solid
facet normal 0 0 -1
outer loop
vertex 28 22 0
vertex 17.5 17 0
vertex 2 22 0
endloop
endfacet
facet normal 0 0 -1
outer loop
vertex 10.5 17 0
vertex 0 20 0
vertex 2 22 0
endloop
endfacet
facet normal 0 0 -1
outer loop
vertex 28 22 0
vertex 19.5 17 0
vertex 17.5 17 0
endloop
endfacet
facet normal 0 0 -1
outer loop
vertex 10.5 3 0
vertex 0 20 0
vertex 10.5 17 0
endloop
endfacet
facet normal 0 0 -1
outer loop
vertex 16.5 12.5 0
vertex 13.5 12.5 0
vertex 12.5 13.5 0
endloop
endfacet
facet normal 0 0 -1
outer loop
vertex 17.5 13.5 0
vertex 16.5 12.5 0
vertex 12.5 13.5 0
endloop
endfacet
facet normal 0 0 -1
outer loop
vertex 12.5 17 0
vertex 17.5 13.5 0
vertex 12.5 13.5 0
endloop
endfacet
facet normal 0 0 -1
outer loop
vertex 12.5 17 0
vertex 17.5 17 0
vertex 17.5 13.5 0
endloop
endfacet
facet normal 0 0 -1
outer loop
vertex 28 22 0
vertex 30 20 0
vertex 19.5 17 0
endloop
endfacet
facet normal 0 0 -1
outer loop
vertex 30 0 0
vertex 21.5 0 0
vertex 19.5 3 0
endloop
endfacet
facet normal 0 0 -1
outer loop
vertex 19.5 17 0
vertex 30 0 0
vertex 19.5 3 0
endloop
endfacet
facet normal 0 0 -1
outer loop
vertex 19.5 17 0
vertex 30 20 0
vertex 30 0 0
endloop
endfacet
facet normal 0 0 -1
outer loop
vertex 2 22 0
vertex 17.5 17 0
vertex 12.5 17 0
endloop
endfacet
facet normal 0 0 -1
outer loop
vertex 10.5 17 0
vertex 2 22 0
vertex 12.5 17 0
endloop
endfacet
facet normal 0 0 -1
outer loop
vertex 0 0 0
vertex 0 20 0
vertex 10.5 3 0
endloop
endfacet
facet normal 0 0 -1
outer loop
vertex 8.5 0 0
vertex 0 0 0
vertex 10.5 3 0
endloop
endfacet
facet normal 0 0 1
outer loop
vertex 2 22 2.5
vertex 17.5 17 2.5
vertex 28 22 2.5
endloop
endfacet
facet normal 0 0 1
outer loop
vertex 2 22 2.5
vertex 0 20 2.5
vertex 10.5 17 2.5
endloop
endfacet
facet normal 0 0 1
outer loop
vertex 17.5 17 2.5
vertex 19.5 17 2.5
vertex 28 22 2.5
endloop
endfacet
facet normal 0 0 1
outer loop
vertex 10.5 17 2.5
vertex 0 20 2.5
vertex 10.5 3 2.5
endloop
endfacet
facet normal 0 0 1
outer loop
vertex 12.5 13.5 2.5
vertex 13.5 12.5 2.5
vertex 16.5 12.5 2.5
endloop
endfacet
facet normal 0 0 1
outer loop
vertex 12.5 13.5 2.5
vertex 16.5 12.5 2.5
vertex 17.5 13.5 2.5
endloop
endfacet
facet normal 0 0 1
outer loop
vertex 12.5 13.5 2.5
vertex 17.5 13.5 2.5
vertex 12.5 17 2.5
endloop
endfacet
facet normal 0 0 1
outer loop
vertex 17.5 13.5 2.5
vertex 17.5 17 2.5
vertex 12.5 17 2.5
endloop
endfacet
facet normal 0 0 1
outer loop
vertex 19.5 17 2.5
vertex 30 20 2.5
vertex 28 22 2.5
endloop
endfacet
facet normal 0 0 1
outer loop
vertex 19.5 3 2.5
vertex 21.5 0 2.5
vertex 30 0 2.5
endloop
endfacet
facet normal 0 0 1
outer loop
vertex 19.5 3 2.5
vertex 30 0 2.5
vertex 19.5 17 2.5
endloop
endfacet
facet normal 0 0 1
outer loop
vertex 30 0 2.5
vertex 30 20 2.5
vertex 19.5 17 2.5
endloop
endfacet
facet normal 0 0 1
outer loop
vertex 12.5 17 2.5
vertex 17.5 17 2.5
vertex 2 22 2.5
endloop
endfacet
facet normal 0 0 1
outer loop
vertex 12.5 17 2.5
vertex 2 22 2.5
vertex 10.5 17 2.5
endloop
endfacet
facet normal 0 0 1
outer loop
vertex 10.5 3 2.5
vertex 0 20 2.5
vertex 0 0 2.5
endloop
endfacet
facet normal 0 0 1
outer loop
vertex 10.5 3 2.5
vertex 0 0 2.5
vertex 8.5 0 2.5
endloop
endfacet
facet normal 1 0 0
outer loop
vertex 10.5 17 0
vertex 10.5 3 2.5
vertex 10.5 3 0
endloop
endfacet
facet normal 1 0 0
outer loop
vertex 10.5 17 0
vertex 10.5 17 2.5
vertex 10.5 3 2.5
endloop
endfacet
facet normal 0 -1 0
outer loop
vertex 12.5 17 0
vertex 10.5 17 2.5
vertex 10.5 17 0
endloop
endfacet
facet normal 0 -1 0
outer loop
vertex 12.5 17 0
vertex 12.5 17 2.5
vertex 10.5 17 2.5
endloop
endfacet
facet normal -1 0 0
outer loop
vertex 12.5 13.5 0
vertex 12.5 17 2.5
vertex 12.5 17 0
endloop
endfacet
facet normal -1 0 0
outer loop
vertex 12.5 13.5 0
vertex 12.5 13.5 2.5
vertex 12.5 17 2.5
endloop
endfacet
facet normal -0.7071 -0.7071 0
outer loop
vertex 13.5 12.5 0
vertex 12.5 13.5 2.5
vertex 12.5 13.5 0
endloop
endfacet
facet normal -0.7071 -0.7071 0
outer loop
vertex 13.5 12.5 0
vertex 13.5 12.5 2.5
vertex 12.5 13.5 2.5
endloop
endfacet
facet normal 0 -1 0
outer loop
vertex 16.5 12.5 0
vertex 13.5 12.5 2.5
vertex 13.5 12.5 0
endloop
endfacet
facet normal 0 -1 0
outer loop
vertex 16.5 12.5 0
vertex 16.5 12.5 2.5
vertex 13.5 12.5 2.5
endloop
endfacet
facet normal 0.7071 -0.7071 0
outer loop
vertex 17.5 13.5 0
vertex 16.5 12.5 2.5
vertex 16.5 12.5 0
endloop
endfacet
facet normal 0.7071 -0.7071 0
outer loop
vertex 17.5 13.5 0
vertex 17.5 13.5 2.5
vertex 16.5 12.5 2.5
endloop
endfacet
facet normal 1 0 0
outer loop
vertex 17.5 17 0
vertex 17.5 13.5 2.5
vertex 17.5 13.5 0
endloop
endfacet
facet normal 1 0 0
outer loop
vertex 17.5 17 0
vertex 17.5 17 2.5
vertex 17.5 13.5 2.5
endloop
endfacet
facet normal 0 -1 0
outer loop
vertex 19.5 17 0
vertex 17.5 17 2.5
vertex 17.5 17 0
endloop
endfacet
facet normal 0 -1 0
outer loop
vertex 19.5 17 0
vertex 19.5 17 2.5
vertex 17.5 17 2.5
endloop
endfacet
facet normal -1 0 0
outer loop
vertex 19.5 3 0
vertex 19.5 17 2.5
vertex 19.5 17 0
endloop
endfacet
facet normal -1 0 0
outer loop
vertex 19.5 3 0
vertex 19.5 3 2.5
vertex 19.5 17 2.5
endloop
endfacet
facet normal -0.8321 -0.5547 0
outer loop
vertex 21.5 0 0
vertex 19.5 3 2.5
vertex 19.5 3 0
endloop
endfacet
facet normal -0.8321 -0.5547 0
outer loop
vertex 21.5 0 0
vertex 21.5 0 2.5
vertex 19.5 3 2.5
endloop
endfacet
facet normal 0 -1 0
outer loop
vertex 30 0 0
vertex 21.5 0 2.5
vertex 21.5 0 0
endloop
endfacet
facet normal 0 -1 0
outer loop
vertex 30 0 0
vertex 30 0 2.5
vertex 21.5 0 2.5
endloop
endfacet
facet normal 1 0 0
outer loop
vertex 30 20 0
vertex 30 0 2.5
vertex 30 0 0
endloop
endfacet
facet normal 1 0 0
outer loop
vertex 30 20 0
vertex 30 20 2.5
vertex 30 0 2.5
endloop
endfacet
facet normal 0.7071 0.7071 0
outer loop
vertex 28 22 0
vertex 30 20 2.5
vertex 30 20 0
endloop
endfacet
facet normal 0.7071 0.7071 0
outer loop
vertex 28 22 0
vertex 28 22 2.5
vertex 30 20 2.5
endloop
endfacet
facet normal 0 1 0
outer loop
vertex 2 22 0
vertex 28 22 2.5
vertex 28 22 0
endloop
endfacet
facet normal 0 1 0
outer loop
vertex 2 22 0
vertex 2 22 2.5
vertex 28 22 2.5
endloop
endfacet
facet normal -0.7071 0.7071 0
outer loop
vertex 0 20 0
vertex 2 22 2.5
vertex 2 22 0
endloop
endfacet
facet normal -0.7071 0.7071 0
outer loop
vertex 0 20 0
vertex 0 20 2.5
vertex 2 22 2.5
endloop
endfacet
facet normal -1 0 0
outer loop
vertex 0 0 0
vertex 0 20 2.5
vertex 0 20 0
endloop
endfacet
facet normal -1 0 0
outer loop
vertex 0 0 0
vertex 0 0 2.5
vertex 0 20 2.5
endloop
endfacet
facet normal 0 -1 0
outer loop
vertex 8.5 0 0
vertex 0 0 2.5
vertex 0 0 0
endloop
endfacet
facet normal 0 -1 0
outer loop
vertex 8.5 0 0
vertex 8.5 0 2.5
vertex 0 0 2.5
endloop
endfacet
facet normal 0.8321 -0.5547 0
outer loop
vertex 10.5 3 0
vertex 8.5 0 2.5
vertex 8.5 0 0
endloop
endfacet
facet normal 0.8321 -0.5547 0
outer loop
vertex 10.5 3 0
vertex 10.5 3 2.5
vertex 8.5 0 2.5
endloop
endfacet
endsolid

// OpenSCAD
// 卡扣（30 × 22 × 2.5）
// ────────────────────────────────────────────────────────────────
// 按手绘尺寸图 + 实物照片复刻的平板卡扣：
//   • 外形 30 × 22，厚 2.5；顶部两角 2mm 倒角（照片可见，可用 TOP_CH 关掉）；
//   • 中间竖直开槽：宽 9，槽顶距底边 17（即距顶边 5），底端开口、贯通厚度；
//   • 槽顶正中向下伸出一条舌片（卡钩）：宽 5、长 4.5，端部两角 1mm 倒角；
//   • 槽口下端两侧各向外扩 2mm（扩口高 3mm），形成引导用的喇叭口。
//
// 坐标：正视图中 x 向右、y 向上，外形左下角在 (0,0)；厚度沿 +Z 拉伸。
// 参数集中在文件末尾。
// ────────────────────────────────────────────────────────────────

module latch_profile() {
    // 单一闭合轮廓：外框 + 底端开口的竖槽 + 槽顶下垂的舌片
    polygon(points = [
        [0, 0],                             // 左下角
        [MOUTH_L, 0],                       // 底边 → 左侧扩口起点
        [SLOT_X0, FLARE_H],                 // 左侧扩口斜边
        [SLOT_X0, SLOT_TOP],                // 槽左侧壁
        [TAB_X0, SLOT_TOP],                 // 槽顶左段
        [TAB_X0, TAB_BOT + TAB_CH],         // 舌片左侧
        [TAB_X0 + TAB_CH, TAB_BOT],         // 舌片左下倒角
        [TAB_X1 - TAB_CH, TAB_BOT],         // 舌片底边
        [TAB_X1, TAB_BOT + TAB_CH],         // 舌片右下倒角
        [TAB_X1, SLOT_TOP],                 // 舌片右侧
        [SLOT_X1, SLOT_TOP],                // 槽顶右段
        [SLOT_X1, FLARE_H],                 // 槽右侧壁
        [MOUTH_R, 0],                       // 右侧扩口斜边
        [W, 0],                             // 右下角
        [W, H - TOP_CH],                    // 右边
        [W - TOP_CH, H],                    // 右上倒角
        [TOP_CH, H],                        // 顶边
        [0, H - TOP_CH]                     // 左上倒角
    ]);
}

linear_extrude(height = T)
    latch_profile();

// ═══════════════════ 参数（集中在文件末尾）═══════════════════
W = 30;             // 外形宽
H = 22;             // 外形高
T = 2.5;            // 厚度

SLOT_W = 9;         // 中央竖槽宽
SLOT_TOP = 17;      // 竖槽顶到底边的距离（顶部实心边 = H - SLOT_TOP = 5）
TAB_W = 5;          // 舌片宽
TAB_LEN = 4.5;      // 舌片长（从槽顶往下量，对应图中 4.5）
TAB_CH = 1;         // 舌片端部两角 45° 倒角

FLARE = 2;          // 槽口底端每侧外扩量（底口宽 = SLOT_W + 2*FLARE = 13）
FLARE_H = 3;        // 扩口段高度
TOP_CH = 2;         // 外形顶部两角 45° 倒角（照片有此倒角；设 0 恢复直角）

// ───────── 派生量（必须写在上面参数之后）─────────
SLOT_X0 = (W - SLOT_W) / 2;
SLOT_X1 = (W + SLOT_W) / 2;
TAB_X0 = (W - TAB_W) / 2;
TAB_X1 = (W + TAB_W) / 2;
TAB_BOT = SLOT_TOP - TAB_LEN;
MOUTH_L = SLOT_X0 - FLARE;
MOUTH_R = SLOT_X1 + FLARE;
